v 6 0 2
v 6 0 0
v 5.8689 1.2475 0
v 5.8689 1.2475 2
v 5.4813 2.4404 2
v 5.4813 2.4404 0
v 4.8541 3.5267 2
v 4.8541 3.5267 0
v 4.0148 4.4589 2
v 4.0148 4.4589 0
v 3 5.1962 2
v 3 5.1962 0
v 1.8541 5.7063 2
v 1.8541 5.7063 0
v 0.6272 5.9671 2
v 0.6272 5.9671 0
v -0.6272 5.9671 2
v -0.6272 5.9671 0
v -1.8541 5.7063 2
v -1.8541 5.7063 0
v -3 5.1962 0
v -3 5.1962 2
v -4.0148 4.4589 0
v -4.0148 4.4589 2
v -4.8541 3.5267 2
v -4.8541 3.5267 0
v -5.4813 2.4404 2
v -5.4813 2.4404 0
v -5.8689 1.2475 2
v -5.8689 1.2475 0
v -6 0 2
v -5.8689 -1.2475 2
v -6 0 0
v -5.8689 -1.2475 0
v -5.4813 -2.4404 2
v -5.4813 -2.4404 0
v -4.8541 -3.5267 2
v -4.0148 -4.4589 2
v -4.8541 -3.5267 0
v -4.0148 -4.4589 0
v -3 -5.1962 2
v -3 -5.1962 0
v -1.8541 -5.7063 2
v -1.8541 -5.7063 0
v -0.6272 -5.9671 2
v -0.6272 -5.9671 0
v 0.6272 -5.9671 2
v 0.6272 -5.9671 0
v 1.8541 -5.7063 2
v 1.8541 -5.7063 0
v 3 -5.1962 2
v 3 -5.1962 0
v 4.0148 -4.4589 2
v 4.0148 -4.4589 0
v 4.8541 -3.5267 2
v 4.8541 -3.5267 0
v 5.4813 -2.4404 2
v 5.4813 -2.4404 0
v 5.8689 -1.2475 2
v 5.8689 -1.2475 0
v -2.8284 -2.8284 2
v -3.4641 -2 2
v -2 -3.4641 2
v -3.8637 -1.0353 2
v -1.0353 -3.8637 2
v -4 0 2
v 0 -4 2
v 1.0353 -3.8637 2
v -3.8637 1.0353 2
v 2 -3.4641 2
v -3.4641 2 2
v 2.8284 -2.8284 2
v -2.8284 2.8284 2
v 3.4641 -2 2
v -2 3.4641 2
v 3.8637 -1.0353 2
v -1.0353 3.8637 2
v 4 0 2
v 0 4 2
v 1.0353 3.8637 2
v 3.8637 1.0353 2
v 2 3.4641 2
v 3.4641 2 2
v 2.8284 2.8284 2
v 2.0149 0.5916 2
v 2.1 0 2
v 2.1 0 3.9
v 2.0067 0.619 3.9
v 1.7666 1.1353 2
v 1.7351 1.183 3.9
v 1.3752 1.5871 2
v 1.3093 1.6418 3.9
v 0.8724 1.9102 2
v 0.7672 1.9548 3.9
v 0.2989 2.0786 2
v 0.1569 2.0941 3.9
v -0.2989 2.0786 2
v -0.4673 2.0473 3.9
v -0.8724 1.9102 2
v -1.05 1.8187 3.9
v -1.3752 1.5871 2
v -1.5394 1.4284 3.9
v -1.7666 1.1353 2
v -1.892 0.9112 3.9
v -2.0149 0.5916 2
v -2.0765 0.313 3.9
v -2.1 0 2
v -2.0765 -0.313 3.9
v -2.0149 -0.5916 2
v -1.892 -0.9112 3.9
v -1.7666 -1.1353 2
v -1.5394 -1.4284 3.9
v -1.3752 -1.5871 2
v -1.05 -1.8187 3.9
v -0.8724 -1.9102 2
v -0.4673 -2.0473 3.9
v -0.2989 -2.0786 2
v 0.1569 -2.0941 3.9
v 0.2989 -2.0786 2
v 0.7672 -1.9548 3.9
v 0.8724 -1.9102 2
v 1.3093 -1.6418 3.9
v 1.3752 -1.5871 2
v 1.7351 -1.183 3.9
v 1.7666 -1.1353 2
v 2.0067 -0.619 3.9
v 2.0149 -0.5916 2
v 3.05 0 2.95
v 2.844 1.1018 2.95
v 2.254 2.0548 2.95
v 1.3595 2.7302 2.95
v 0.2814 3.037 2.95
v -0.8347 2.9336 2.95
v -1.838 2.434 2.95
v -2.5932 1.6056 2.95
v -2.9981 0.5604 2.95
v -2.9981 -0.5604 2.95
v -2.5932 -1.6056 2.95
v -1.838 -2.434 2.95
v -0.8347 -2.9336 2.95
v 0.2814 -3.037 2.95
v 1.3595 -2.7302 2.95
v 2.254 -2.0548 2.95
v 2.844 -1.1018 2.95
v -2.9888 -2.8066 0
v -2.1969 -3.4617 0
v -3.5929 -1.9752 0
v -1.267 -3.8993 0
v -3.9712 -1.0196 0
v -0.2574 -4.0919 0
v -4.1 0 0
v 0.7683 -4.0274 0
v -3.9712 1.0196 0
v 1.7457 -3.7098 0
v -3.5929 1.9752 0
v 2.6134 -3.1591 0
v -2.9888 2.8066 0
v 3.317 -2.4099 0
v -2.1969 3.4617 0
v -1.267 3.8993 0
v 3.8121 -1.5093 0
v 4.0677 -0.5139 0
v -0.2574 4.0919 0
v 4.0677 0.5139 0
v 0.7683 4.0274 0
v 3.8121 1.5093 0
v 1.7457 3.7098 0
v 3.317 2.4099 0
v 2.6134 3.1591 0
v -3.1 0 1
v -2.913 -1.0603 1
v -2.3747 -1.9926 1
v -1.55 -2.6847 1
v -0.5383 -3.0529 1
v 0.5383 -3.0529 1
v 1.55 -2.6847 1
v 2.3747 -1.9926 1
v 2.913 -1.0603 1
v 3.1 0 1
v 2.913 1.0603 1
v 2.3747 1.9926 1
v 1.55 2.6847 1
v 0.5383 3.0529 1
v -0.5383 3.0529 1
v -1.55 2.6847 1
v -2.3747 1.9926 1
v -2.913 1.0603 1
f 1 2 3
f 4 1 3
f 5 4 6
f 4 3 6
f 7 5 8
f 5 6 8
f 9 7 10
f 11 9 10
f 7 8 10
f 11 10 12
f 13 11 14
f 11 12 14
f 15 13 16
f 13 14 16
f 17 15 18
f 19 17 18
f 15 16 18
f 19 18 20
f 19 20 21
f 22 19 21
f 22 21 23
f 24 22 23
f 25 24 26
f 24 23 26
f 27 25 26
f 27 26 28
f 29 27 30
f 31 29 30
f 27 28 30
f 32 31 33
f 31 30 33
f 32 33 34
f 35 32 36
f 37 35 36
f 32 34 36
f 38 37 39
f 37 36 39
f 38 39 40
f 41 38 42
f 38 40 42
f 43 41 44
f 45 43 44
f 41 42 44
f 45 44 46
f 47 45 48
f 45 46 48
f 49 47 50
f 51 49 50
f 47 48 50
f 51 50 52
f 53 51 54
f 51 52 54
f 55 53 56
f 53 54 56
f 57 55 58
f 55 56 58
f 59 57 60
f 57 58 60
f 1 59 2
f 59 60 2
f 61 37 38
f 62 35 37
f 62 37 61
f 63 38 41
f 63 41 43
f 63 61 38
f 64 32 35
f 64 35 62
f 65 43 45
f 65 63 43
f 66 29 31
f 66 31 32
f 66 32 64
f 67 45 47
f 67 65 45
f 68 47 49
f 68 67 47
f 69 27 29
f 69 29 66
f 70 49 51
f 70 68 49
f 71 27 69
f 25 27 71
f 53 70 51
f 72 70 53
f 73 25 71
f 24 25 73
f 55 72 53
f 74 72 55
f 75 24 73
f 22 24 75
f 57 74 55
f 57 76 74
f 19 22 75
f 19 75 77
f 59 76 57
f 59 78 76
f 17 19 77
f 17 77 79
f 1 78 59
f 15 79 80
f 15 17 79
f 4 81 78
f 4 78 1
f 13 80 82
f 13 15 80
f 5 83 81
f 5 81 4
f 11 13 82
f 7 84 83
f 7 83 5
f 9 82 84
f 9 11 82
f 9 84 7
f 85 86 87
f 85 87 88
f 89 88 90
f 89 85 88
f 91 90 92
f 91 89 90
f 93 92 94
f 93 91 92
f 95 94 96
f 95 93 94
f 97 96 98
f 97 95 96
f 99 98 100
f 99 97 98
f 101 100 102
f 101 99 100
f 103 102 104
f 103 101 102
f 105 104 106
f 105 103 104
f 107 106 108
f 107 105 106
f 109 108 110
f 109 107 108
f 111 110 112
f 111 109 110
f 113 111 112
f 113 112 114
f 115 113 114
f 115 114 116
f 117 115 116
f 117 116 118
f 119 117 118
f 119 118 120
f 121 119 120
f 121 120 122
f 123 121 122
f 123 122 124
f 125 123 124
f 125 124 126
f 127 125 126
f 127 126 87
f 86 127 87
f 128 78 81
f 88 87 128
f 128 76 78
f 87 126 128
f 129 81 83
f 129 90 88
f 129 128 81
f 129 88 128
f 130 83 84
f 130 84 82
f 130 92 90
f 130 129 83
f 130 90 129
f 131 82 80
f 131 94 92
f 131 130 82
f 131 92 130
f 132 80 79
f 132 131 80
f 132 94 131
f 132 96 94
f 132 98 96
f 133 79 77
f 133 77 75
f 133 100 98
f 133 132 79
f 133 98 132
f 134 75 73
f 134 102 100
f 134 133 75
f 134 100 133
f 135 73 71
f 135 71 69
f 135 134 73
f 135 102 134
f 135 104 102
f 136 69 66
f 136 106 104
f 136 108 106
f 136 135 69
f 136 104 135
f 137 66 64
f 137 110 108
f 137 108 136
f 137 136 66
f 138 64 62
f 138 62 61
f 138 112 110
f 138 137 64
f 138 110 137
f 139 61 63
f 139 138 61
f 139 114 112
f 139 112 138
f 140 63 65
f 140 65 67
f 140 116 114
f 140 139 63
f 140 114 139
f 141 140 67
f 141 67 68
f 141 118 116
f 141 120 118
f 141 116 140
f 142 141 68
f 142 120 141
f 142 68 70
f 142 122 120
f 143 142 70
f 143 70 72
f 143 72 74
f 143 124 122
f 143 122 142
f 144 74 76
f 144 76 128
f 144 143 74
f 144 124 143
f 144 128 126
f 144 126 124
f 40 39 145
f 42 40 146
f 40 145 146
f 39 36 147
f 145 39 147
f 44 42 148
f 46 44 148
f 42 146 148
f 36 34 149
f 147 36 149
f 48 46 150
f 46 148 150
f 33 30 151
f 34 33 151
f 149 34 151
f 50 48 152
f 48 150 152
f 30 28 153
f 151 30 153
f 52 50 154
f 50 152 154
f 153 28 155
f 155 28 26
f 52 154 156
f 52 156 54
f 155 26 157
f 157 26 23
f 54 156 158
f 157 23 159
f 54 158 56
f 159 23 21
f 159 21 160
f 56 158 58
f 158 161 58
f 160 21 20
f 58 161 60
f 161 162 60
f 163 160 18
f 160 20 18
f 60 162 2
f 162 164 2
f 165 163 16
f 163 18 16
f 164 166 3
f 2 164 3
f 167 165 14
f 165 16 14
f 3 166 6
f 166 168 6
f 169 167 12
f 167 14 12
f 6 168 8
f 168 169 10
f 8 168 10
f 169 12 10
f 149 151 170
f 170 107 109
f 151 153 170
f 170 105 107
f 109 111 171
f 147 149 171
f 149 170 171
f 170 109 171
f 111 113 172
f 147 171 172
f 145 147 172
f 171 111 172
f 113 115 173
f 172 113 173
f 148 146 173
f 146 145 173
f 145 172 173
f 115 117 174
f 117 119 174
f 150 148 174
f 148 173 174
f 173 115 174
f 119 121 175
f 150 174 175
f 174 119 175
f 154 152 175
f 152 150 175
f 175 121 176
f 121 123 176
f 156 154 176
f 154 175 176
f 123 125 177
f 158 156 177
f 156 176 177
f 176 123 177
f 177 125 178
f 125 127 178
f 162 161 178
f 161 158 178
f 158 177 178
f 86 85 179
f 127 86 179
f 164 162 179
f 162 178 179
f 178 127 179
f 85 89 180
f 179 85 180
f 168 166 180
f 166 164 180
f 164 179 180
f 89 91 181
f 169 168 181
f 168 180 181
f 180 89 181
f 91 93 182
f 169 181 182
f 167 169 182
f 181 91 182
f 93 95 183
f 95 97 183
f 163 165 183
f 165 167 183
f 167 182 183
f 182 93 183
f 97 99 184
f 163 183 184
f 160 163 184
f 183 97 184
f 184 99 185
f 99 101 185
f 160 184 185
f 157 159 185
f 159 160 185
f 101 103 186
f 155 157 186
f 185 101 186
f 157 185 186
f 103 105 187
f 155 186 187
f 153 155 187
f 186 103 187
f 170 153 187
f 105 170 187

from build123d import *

# Parameters (mm, degrees)
SKETCH037_R         = 6
SKETCH037_R_2       = 2.1
PAD018_DEPTH        = 2
HOLE009_D           = 4.2
HOLE009_DEPTH       = 25
HOLE009_CSINK_D     = 8.2
HOLE009_CSINK_ANGLE = 90


with BuildPart() as part:
    # Sketch037 → Pad018 (new body)
    with BuildSketch(Plane.XY):
        Circle(SKETCH037_R)
        Circle(SKETCH037_R_2, mode=Mode.SUBTRACT)
    extrude(amount=PAD018_DEPTH)

    # Sketch039 (on DatumPlane) → Revolution (revolve)
    with BuildSketch(Plane(origin=(0, 0, 2), x_dir=(1, 0, 0), z_dir=(0, -1, 0))):
        Polygon((2.1, 1.9), (2.1, 0), (4, 0), align=None)
    revolve(axis=Axis((0, 0, 2), (0, 0, 1)))

    # Hole009
    with Locations(Plane(origin=(0, 0, 0), x_dir=(1, 0, 0), z_dir=(0, 0, -1))):
        with Locations((0, 0)):
            CounterSinkHole(HOLE009_D / 2, HOLE009_CSINK_D / 2, depth=HOLE009_DEPTH, counter_sink_angle=HOLE009_CSINK_ANGLE)


solid = part.part
